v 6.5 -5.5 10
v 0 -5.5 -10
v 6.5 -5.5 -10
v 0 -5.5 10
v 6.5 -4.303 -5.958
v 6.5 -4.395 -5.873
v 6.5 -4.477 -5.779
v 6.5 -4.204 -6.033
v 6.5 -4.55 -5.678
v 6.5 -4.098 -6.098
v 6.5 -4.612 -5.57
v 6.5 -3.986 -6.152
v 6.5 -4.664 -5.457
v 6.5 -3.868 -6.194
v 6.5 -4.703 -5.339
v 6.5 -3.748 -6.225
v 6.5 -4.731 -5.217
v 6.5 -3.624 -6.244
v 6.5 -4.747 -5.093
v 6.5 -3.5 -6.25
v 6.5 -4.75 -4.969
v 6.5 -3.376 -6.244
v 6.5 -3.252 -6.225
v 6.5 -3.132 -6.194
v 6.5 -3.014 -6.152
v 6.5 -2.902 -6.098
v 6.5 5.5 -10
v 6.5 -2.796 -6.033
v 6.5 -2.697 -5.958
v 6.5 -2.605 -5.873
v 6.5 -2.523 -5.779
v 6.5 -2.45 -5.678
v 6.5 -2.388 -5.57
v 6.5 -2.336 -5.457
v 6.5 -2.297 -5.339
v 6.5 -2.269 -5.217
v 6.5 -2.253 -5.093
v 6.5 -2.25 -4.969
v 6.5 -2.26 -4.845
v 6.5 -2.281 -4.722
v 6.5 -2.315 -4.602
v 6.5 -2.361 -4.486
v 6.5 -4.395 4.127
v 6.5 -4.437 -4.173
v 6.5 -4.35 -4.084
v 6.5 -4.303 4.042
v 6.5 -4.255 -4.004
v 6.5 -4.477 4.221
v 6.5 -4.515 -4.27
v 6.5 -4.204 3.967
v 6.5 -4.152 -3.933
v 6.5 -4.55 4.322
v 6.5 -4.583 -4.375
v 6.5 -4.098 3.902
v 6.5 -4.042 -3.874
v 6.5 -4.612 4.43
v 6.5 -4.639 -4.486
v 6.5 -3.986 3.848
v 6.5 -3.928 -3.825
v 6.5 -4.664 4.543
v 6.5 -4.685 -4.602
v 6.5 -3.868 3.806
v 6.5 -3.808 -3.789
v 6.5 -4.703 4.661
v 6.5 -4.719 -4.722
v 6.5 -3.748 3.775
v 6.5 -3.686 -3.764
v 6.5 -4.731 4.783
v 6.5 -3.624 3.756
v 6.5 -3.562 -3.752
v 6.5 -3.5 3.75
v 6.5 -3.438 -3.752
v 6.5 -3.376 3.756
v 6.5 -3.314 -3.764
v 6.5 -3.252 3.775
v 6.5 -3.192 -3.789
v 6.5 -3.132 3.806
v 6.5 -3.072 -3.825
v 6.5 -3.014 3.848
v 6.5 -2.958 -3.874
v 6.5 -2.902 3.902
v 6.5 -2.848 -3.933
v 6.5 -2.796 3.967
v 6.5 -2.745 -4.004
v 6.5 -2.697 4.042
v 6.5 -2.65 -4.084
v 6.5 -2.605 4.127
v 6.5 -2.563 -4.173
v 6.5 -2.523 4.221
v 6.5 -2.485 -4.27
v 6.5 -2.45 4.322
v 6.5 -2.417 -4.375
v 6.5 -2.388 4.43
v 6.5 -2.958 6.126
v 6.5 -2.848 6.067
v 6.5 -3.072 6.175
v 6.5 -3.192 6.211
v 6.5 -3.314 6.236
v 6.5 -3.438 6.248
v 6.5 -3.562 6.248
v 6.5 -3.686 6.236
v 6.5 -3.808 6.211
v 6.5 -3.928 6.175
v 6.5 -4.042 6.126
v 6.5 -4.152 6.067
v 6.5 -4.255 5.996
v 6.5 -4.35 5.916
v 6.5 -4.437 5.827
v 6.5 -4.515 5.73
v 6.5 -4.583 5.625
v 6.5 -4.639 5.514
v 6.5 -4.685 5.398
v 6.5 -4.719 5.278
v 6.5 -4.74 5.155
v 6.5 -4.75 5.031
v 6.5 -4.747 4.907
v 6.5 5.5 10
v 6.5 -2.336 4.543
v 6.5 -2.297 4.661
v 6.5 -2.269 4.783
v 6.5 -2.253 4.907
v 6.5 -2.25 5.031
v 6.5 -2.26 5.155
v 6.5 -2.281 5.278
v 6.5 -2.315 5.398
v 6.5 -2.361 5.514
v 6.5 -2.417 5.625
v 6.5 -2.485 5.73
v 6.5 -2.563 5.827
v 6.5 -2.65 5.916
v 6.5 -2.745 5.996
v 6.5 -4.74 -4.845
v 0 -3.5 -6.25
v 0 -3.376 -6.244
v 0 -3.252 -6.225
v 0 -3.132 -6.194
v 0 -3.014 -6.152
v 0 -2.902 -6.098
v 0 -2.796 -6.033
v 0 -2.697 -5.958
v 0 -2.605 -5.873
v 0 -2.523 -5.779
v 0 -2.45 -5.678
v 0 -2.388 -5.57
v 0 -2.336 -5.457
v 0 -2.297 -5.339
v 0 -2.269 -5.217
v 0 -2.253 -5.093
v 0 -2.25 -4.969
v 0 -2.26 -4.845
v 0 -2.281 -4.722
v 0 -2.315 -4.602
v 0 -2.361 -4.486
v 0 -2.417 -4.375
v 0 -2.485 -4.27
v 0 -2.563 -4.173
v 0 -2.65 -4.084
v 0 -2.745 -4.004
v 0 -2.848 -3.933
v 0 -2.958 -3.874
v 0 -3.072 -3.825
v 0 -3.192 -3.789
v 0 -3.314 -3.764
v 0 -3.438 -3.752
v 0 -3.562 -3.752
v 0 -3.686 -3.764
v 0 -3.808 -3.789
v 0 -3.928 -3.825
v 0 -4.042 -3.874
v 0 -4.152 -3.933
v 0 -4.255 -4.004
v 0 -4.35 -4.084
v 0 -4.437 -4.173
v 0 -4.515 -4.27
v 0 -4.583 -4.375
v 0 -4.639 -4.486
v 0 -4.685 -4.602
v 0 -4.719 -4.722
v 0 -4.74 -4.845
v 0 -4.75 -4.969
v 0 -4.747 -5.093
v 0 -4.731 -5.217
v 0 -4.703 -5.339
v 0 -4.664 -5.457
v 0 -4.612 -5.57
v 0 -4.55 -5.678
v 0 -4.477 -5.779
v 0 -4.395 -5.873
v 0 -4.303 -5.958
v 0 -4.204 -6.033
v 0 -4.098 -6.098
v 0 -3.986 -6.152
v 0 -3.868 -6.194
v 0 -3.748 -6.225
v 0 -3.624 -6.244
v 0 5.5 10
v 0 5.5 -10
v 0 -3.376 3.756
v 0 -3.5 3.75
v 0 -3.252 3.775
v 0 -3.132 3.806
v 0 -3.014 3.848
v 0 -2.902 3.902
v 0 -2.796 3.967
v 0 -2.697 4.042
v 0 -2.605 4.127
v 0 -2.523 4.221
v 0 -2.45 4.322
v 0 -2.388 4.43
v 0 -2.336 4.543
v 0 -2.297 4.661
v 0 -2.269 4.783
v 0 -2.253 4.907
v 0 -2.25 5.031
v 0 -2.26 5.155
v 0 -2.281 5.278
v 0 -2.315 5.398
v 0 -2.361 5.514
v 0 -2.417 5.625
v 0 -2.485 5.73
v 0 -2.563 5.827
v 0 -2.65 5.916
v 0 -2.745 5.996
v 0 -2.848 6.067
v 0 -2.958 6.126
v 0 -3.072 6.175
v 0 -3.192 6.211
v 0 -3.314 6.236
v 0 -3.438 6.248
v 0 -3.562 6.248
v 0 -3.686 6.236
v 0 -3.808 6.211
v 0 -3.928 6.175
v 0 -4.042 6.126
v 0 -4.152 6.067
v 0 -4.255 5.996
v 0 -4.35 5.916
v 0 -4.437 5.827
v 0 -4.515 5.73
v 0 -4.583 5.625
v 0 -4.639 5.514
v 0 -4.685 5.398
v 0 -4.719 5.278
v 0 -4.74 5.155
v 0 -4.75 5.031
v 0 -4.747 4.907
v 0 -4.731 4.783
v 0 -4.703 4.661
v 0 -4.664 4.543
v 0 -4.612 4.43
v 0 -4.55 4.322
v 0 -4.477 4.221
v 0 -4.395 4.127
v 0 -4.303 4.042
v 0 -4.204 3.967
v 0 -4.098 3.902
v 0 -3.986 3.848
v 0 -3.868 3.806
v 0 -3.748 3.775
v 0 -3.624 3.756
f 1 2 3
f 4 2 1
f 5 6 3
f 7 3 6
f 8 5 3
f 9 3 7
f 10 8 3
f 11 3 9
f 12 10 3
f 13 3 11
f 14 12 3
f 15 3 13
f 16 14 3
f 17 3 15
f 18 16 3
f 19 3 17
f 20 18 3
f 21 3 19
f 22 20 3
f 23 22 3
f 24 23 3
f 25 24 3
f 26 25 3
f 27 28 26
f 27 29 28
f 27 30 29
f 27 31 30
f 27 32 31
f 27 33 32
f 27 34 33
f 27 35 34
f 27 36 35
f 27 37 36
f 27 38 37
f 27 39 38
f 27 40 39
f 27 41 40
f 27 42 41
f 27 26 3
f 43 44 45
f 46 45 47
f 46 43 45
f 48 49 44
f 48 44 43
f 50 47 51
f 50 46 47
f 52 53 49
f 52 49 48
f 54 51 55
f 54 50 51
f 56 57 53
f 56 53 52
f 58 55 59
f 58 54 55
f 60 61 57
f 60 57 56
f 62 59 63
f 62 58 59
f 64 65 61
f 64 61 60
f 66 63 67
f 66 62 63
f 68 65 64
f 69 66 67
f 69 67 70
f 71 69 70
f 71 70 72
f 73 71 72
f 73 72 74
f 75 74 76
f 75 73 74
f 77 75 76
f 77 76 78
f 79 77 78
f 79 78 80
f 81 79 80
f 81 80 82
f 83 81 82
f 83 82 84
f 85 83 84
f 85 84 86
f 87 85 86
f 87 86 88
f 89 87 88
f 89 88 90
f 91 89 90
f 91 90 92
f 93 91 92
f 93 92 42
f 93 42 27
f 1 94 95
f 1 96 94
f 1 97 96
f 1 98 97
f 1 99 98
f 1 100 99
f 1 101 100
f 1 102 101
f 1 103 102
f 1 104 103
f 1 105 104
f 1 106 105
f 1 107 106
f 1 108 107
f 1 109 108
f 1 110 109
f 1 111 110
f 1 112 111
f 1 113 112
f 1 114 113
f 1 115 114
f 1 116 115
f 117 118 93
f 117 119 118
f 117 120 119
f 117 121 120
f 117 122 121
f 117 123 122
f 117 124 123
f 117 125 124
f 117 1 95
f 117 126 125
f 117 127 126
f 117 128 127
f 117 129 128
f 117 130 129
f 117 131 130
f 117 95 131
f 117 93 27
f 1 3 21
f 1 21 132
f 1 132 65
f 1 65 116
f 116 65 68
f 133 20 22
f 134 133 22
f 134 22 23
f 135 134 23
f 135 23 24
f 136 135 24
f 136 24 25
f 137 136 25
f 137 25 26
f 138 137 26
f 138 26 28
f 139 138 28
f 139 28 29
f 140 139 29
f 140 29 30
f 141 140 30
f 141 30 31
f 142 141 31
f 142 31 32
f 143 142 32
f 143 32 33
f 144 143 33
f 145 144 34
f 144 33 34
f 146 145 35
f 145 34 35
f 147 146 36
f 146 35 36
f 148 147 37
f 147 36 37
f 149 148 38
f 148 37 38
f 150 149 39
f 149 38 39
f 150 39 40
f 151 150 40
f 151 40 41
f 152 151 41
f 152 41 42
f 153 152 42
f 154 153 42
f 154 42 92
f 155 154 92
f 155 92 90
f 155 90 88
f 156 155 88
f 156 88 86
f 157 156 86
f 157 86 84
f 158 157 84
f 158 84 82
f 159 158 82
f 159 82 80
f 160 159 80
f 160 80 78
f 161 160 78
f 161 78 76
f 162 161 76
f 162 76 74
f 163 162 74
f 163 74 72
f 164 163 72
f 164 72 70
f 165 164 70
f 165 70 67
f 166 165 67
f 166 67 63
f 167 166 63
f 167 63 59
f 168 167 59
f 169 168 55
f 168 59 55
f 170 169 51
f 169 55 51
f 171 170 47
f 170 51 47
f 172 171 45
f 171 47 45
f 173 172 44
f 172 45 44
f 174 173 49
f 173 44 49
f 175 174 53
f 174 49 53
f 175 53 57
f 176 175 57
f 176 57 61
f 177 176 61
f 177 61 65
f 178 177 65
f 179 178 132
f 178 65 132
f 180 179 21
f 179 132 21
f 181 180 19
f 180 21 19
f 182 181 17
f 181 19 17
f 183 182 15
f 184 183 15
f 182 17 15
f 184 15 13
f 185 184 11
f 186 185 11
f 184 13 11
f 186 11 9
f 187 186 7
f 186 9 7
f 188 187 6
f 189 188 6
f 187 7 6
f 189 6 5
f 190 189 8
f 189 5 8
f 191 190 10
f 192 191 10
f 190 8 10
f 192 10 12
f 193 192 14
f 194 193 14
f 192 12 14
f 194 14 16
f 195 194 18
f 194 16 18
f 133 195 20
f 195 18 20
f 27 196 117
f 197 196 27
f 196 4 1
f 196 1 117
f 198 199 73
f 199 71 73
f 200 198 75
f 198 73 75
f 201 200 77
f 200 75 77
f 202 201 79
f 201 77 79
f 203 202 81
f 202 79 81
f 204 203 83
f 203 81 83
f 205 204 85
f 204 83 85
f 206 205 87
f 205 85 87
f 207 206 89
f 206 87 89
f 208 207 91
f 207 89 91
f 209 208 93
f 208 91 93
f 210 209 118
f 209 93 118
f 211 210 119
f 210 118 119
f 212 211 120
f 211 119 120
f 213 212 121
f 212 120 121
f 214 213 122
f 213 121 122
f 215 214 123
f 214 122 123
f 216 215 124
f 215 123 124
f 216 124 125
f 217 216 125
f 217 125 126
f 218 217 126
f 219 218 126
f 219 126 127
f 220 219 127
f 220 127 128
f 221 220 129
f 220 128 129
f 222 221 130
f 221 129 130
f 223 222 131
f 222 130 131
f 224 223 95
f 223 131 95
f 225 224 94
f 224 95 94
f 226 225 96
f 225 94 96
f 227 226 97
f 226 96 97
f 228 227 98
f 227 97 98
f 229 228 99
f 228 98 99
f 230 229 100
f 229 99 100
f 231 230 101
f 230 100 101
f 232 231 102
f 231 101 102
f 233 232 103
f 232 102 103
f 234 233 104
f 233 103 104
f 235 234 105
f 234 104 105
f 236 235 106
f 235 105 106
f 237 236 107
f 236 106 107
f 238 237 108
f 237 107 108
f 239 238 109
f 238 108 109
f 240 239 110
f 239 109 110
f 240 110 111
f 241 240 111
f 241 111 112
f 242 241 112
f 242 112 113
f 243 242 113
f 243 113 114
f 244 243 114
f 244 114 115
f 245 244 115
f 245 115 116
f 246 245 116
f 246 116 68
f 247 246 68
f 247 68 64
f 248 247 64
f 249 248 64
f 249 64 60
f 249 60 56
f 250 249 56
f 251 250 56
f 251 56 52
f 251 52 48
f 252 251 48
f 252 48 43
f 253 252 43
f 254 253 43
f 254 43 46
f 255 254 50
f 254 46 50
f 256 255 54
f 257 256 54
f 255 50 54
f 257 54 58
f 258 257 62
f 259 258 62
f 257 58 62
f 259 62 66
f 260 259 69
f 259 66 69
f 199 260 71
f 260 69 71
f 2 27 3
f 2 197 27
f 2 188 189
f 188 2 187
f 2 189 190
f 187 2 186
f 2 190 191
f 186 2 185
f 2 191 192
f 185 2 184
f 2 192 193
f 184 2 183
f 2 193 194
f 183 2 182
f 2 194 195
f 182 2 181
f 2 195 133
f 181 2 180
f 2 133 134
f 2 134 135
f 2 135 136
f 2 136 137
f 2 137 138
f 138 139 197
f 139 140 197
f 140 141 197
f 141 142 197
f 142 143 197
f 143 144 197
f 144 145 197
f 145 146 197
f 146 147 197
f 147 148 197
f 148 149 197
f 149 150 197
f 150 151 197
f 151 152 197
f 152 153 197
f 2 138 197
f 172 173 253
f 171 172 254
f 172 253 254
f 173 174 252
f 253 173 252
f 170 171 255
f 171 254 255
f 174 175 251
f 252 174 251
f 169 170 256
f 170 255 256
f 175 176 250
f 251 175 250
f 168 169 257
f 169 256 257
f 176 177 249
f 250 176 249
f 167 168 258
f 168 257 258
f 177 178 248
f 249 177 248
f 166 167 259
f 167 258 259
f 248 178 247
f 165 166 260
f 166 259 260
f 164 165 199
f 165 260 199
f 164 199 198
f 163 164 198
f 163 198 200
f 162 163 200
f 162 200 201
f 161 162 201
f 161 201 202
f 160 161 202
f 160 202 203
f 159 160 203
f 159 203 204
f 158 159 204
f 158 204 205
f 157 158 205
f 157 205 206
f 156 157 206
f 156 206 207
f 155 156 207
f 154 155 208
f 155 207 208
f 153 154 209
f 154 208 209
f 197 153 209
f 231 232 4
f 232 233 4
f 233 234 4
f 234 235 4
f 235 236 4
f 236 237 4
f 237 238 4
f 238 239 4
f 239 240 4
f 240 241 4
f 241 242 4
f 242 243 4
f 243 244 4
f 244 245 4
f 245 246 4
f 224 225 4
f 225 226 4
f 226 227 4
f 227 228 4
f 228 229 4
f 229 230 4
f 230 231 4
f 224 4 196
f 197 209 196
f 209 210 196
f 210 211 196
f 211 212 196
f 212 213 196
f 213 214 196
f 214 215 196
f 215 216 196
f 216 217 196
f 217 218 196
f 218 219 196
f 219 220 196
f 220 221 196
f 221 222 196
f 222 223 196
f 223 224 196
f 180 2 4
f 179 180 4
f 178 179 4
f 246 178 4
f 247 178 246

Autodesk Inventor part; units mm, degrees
ref_plane "YZ Plane" through (0, 0, 0) normal (1, 0, 0) x (0, 1, 0)
ref_plane "XZ Plane" through (0, 0, 0) normal (0, 1, 0) x (-1, 0, 0)
ref_plane "XY Plane" through (0, 0, 0) normal (0, 0, 1) x (1, 0, 0)
sketch "Szkic1" plane through (0, 0, 0) normal (1, 0, 0) x (0, 1, 0)
  line L0 (-5.5, 10) -> (5.5, 10)
  line L1 (5.5, 10) -> (5.5, -10)
  line L2 (5.5, -10) -> (-5.5, -10)
  line L3 (-5.5, -10) -> (-5.5, 10)
  line L4 (-5.5, 10) -> (5.5, -10) construction
  line L5 (5.5, 10) -> (-5.5, -10) construction
  point P0 (0, 0)
  dimension "d0" = 20
  dimension "d1" = 11
extrude "Wyciągnięcie proste1" add sketch "Szkic1" along normal blind 6.5
sketch "Szkic2" plane through (6.5, 0, 0) normal (1, 0, 0) x (0, 0, -1)
  line L0 (-9.9535, -3.5) -> (10, -3.5) construction
  line L1 (10, -5.5) -> (10, 5.5) projected
  line L2 (-10, -5.5) -> (10, -5.5) projected
  circle A0 centre (-5, -3.5) radius 1.25
  circle A1 centre (5, -3.5) radius 1.25
  line L3 (-10, 5.5) -> (-10, -5.5) projected
  point P0 (0, 0)
  dimension "d4" = 2
  dimension "d5" = 5
  dimension "d6" = 5
  dimension "d7" = 2.5
  dimension "d8" = 2.5
extrude "Wyciągnięcie proste2" cut sketch "Szkic2" against normal through all
properties part number "Stop_sw" material "Tworzywo sztuczne ABS"
